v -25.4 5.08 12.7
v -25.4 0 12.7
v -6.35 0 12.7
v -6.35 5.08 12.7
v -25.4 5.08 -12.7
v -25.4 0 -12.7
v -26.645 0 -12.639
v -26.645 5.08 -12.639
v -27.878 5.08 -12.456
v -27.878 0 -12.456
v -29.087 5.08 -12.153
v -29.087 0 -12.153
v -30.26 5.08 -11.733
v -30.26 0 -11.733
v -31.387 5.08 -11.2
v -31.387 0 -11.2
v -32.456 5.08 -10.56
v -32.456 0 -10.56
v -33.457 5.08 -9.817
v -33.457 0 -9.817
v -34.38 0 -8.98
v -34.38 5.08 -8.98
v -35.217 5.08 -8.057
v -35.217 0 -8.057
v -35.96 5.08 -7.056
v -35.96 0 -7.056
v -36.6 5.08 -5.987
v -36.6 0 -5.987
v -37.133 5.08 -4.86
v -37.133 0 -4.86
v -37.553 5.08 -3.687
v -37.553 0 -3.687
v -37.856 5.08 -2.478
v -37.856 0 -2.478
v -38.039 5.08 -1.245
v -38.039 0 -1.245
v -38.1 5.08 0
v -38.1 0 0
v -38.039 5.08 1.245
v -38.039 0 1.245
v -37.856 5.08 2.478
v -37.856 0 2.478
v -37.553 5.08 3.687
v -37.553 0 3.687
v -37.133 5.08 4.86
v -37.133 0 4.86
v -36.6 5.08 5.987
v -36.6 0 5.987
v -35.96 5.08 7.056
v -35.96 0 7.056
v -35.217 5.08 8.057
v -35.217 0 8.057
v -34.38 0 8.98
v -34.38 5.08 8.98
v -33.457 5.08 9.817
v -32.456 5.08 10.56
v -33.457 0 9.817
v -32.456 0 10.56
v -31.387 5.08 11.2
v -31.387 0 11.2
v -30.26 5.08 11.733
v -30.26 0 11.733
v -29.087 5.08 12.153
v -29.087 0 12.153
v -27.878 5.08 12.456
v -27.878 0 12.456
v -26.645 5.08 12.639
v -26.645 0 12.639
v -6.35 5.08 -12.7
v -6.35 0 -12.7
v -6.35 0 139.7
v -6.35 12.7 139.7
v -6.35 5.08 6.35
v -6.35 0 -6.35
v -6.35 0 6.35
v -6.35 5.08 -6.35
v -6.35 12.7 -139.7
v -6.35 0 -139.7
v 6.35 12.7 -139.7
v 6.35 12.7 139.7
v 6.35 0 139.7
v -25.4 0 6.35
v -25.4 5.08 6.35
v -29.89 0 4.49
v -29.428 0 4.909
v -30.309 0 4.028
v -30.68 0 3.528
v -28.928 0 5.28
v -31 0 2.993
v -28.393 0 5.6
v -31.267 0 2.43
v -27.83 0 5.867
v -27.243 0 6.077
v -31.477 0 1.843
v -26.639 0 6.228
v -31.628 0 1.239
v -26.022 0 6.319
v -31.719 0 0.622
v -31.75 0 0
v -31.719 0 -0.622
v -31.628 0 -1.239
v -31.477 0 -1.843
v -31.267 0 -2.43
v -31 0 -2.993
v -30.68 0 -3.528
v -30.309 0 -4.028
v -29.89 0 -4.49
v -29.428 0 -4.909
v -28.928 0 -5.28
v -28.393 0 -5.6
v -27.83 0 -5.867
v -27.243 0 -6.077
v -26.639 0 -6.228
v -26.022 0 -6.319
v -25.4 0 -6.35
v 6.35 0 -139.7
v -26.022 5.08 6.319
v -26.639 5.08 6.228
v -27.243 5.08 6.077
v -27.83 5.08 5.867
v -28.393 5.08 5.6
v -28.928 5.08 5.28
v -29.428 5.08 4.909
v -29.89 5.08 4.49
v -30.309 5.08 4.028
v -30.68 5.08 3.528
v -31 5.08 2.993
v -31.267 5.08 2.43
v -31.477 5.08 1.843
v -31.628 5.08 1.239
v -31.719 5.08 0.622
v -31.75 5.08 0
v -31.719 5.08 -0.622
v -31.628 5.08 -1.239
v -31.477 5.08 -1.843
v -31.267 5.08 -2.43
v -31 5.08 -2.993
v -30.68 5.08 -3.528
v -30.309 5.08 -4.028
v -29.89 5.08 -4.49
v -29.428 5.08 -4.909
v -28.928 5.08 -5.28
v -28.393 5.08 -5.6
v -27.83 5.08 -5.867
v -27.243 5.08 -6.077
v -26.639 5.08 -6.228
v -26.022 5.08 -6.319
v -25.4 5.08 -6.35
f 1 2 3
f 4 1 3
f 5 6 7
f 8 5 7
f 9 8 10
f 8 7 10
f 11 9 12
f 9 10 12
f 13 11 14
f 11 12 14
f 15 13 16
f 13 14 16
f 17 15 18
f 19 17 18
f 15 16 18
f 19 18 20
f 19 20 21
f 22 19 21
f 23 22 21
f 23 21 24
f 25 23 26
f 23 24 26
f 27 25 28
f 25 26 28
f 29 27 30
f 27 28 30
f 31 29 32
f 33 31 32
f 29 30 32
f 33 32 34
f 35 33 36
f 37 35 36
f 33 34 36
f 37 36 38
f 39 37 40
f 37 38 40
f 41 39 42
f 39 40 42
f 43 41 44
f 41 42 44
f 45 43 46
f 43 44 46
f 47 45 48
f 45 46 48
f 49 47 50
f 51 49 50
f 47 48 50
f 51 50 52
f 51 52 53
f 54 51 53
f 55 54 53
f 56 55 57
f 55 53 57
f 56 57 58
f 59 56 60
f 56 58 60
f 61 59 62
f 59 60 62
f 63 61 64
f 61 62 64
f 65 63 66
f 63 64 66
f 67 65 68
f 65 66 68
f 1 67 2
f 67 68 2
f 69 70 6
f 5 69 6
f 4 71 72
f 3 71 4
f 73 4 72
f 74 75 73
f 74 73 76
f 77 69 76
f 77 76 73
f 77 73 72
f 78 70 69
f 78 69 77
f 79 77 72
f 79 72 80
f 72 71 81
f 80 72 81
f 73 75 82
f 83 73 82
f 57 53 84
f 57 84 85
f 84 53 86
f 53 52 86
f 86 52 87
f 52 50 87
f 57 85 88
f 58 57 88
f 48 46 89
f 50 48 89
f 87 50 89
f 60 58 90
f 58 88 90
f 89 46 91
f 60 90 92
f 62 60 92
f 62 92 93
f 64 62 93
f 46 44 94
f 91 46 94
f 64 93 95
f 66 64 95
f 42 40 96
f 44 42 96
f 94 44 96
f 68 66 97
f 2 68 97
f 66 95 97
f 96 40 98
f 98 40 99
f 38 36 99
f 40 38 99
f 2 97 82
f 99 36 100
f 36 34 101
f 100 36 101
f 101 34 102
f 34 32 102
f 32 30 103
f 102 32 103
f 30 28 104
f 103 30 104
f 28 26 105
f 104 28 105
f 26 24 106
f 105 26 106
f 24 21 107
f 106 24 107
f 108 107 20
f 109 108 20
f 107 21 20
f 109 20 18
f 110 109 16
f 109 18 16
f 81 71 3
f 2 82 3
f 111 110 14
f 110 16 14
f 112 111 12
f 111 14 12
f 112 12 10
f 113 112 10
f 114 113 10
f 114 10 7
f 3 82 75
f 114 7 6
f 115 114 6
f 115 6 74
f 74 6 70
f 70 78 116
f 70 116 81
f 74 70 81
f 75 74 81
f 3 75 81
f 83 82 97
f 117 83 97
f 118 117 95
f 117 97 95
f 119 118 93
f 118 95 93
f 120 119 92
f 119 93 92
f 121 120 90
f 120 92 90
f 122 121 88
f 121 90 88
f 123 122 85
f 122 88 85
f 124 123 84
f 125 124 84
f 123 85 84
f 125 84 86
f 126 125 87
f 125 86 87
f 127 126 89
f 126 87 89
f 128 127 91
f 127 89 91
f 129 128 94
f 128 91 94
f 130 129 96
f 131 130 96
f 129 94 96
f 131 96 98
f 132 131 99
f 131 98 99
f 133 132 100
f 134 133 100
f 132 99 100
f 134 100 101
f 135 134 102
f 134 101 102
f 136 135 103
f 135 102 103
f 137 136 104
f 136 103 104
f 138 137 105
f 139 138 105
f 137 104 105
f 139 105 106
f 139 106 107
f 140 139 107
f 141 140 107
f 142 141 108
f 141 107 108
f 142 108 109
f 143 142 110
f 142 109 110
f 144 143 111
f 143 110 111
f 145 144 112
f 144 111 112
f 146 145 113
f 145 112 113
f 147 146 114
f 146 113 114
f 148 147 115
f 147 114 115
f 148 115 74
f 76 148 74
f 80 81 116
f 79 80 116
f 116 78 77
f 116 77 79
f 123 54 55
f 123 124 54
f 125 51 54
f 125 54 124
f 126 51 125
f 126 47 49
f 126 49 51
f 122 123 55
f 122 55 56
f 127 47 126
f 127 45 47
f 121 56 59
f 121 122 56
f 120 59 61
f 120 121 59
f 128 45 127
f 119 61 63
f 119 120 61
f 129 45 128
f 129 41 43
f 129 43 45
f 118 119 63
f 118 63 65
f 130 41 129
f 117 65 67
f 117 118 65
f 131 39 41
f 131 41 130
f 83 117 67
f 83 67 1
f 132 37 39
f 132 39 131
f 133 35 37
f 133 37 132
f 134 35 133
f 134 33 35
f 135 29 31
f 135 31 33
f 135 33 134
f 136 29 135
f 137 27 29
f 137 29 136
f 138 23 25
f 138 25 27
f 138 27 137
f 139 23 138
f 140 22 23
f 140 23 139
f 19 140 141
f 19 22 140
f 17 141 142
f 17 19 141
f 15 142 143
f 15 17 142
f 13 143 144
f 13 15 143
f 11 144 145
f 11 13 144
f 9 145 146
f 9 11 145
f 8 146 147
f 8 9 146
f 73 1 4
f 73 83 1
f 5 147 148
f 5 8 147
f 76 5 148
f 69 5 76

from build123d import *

# Parameters (mm, degrees)
BOSS_EXTRUDE1_DEPTH = 12.7
BOSS_EXTRUDE2_DEPTH = 5.08


with BuildPart() as part:
    # Sketch1 → Boss-Extrude1 (new body)
    with BuildSketch(Plane(origin=(0, 0, 0), x_dir=(1, 0, 0), z_dir=(0, 1, 0))):
        Polygon((-6.35, -12.7), (-6.35, -139.7), (6.35, -139.7), (6.35, 139.7), (-6.35, 139.7), (-6.35, 12.7), (-6.35, 6.35), (-6.35, -6.35), align=None)
    extrude(amount=BOSS_EXTRUDE1_DEPTH)

    # Sketch1<4> → Boss-Extrude2 (add)
    with BuildSketch(Plane(origin=(0, 0, 0), x_dir=(1, 0, 0), z_dir=(0, 1, 0))):
        with BuildLine():
            Line((-25.4, -12.7), (-6.35, -12.7))
            Line((-6.35, -12.7), (-6.35, -6.35))
            Line((-6.35, -6.35), (-25.4, -6.35))
            ThreePointArc((-25.4, -6.35), (-31.75, 0), (-25.4, 6.35))
            Line((-25.4, 6.35), (-6.35, 6.35))
            Line((-6.35, 6.35), (-6.35, 12.7))
            Line((-6.35, 12.7), (-25.4, 12.7))
            ThreePointArc((-25.4, 12.7), (-38.1, 0), (-25.4, -12.7))
        make_face()
    extrude(amount=BOSS_EXTRUDE2_DEPTH)


solid = part.part
